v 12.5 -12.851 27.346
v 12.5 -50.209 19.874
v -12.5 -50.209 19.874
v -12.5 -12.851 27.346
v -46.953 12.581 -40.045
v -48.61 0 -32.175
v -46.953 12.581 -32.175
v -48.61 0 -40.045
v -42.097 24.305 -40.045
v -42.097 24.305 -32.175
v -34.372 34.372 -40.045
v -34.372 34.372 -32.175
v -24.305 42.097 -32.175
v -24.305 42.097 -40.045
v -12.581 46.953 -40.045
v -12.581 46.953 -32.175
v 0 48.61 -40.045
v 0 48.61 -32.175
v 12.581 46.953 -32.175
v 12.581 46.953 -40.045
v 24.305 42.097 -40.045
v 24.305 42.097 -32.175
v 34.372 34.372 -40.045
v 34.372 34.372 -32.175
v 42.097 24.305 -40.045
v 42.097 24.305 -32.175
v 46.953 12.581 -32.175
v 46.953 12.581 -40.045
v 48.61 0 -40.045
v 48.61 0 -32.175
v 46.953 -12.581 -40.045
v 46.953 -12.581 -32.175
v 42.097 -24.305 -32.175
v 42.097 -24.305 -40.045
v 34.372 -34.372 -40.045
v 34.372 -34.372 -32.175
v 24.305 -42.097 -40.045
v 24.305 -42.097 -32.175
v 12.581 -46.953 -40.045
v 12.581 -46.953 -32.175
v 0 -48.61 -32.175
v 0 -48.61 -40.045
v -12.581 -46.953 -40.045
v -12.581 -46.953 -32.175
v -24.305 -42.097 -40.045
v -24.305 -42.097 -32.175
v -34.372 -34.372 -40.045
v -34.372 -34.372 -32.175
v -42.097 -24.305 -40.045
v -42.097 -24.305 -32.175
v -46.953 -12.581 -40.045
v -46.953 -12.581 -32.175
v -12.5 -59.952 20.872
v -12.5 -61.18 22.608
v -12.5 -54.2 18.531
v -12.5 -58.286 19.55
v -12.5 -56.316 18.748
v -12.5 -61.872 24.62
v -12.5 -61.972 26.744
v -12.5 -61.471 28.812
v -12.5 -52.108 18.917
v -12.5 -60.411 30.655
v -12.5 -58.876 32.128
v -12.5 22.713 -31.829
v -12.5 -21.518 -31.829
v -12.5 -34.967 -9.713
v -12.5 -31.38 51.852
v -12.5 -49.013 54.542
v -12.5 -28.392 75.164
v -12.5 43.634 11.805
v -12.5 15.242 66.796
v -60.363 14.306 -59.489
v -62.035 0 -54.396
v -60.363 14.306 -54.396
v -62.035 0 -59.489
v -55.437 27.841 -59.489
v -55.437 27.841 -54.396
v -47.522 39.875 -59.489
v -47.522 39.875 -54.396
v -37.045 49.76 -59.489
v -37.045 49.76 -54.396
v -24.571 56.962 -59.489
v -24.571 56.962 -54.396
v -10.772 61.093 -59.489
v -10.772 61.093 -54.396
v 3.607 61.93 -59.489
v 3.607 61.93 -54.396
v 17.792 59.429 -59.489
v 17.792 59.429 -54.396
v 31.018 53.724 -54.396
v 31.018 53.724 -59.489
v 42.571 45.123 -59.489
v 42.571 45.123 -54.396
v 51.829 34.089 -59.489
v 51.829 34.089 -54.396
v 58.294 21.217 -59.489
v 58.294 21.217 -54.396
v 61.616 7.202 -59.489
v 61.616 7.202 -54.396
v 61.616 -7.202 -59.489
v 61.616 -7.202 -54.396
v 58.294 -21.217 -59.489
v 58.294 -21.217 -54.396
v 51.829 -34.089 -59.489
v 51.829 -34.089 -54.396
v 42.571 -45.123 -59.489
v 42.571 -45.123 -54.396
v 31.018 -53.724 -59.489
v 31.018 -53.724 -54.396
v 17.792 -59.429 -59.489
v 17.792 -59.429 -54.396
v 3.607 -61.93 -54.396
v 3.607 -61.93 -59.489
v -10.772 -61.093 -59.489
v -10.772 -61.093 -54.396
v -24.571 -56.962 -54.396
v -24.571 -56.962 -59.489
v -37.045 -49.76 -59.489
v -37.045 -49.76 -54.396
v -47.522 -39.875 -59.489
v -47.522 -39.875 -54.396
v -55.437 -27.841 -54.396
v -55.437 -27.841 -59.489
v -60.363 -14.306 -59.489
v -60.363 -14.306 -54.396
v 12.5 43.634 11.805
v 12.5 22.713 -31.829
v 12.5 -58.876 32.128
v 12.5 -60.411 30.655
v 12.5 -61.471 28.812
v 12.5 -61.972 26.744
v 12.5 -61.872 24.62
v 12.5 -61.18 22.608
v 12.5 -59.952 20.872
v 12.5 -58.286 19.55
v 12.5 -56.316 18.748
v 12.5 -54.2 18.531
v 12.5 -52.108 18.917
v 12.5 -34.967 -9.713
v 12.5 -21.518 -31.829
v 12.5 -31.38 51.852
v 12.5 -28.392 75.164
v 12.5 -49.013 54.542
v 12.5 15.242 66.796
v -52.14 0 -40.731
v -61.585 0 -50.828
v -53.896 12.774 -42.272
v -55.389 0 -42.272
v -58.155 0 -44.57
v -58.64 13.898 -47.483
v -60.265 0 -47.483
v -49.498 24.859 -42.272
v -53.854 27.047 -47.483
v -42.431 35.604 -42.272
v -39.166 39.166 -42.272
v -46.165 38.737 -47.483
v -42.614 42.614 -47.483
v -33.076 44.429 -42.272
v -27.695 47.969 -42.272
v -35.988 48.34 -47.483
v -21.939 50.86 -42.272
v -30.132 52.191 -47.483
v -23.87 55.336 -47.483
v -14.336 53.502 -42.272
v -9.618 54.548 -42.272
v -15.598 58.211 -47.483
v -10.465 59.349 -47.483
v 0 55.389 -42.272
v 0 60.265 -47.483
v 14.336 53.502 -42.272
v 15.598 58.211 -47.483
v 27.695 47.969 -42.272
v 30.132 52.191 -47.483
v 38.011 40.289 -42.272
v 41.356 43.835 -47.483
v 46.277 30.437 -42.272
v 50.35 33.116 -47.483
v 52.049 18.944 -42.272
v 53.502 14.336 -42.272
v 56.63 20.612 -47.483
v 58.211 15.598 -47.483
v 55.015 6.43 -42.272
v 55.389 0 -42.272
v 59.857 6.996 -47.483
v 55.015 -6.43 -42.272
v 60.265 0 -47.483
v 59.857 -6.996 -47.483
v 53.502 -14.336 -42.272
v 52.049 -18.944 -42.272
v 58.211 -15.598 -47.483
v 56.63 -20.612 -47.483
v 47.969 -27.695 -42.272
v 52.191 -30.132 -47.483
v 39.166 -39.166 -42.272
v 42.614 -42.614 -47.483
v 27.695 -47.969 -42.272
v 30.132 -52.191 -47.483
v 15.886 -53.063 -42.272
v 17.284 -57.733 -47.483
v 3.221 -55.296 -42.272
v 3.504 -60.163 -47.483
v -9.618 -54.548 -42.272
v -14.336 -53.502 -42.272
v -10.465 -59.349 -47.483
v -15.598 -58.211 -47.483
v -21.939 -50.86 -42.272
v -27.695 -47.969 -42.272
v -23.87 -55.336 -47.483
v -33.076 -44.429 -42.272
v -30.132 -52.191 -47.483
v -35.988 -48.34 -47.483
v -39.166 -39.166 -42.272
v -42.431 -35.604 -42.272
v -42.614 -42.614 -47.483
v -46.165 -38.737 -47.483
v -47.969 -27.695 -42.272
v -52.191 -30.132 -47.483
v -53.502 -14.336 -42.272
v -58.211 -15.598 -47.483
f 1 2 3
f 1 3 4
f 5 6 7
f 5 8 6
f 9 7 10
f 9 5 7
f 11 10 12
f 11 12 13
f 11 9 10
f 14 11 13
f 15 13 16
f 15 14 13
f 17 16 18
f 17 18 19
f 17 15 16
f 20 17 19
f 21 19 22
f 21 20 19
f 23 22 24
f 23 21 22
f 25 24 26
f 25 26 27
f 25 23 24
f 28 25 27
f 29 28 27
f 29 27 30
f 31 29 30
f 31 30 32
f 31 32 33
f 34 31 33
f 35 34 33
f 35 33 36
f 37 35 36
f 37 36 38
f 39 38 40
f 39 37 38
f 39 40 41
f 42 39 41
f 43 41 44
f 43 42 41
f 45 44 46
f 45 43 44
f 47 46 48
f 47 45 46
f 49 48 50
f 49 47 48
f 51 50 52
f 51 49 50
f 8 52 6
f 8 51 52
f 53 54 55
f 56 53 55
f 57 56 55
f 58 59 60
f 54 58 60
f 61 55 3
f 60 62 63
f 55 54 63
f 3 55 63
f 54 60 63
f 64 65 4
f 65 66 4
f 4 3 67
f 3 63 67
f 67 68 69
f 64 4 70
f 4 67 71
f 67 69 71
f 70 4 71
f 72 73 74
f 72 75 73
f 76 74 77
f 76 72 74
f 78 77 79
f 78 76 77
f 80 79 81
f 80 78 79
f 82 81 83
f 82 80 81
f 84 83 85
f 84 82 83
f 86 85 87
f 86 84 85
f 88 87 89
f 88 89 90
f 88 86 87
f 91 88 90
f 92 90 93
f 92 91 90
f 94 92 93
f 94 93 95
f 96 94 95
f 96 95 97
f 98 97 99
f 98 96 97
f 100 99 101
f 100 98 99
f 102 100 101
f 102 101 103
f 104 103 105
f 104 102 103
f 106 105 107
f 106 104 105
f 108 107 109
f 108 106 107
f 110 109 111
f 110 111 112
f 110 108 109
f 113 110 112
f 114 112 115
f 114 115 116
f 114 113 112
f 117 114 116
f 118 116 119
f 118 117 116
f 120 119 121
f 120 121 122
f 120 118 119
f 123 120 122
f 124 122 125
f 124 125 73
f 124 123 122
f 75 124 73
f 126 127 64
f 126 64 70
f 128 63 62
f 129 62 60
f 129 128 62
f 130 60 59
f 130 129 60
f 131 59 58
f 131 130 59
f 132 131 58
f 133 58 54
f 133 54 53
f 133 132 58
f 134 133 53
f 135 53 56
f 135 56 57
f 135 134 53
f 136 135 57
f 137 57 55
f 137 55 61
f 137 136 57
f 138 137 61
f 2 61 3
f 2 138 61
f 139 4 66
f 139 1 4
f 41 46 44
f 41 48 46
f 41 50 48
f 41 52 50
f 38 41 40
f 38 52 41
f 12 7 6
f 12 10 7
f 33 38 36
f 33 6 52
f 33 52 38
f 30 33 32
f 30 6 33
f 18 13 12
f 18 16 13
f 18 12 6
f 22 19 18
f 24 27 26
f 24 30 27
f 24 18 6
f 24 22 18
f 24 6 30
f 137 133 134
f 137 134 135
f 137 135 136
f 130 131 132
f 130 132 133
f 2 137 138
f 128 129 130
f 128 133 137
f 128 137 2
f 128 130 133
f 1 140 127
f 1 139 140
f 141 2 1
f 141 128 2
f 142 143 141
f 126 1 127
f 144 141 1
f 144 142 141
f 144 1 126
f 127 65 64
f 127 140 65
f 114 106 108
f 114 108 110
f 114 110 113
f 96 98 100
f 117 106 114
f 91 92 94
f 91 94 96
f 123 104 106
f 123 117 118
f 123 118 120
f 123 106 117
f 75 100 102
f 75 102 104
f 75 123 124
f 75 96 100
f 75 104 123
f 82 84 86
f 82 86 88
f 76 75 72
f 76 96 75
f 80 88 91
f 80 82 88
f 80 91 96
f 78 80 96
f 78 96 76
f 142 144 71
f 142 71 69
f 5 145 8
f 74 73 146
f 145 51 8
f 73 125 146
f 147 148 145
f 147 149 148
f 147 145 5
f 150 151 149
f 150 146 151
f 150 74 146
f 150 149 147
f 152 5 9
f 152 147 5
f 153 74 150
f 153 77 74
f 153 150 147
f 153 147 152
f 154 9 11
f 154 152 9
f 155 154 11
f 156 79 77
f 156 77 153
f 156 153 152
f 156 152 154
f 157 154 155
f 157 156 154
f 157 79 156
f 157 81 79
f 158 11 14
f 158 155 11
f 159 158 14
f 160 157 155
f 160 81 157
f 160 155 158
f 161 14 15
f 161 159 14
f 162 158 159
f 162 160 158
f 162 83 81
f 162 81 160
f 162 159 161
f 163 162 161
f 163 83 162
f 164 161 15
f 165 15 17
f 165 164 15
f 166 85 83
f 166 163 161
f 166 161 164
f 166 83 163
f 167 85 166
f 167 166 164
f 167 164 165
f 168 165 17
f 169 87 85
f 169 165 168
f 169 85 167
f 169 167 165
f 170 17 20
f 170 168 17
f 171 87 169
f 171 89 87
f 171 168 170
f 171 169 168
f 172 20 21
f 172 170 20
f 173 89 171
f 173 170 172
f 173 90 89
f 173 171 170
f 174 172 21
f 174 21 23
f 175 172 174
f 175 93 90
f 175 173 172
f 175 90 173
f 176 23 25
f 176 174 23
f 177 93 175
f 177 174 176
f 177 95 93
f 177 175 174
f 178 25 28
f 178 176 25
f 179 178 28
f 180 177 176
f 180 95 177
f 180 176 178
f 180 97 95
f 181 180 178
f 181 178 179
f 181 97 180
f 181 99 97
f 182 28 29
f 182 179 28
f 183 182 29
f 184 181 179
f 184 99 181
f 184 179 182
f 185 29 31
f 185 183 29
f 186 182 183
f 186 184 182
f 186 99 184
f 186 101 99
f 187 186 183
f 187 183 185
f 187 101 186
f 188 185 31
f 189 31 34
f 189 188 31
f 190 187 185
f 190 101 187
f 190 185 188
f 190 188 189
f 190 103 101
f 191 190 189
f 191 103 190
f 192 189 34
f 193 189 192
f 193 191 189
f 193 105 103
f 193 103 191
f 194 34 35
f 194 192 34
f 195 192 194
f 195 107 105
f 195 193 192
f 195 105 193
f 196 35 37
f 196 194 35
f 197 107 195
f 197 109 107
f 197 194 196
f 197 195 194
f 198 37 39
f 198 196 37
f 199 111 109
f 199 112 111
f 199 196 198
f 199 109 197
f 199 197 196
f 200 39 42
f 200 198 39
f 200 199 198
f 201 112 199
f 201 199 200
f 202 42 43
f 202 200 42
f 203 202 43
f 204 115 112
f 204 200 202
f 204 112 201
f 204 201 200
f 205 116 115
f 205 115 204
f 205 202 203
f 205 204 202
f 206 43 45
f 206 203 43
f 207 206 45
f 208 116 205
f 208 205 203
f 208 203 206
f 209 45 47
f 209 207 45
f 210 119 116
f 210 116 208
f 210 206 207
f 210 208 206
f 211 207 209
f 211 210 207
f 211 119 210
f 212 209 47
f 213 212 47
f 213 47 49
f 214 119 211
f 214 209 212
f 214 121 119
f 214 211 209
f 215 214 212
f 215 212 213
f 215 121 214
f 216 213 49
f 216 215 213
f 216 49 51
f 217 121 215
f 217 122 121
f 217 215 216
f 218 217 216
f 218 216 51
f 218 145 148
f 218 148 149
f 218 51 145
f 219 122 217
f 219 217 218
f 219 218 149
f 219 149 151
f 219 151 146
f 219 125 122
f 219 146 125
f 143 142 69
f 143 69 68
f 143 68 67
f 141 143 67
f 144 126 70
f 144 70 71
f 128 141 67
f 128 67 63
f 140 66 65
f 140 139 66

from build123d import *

# Parameters (mm, degrees)
F3_DEPTH = 12.5


with BuildPart() as f1:
    # F0 (on Front) → F1 (revolve)
    with BuildSketch(Plane.XZ):
        with BuildLine():
            Line((-62.035013, -59.488799), (0, -59.488799))
            Line((0, -59.488799), (0, -32.174874))
            Line((0, -32.174874), (-48.609525, -32.174874))
            Line((-48.609525, -32.174874), (-48.609525, -40.044986))
            ThreePointArc((-48.609525, -40.044986), (-58.155423, -44.57031), (-62.035013, -54.396372))
            Line((-62.035013, -54.396372), (-62.035013, -59.488799))
        make_face()
    revolve(axis=Axis((0, 0, -45.831837), (0, 0, -1)))


with BuildPart() as f3:
    # F2 (on Right) → F3 (new body)
    with BuildSketch(Plane.YZ):
        with BuildLine():
            Line((-21.518027, -31.82875), (22.713473, -31.82875))
            Line((22.713473, -31.82875), (43.633778, 11.80503))
            Line((43.633778, 11.80503), (15.241937, 66.795543))
            Line((15.241937, 66.795543), (-28.39184, 75.163662))
            Line((-28.39184, 75.163662), (-49.013283, 54.542221))
            Line((-49.013283, 54.542221), (-31.380456, 51.852472))
            Line((-31.380456, 51.852472), (-58.87571, 32.127611))
            ThreePointArc((-58.87571, 32.127611), (-60.628071, 21.696325), (-50.208729, 19.874288))
            Line((-50.208729, 19.874288), (-12.851043, 27.345827))
            Line((-12.851043, 27.345827), (-34.966797, -9.712999))
            Line((-34.966797, -9.712999), (-21.518027, -31.82875))
        make_face()
    extrude(amount=F3_DEPTH)

    # F4: F3 across face


with BuildPart() as f3_1:
    add(f3.part)
    add(f3.part.mirror(Plane(origin=(0, -3.927759, 20.688251), x_dir=(0, 1, 0), z_dir=(-1, 0, 0))))


solid = Compound([f1.part, f3_1.part])
